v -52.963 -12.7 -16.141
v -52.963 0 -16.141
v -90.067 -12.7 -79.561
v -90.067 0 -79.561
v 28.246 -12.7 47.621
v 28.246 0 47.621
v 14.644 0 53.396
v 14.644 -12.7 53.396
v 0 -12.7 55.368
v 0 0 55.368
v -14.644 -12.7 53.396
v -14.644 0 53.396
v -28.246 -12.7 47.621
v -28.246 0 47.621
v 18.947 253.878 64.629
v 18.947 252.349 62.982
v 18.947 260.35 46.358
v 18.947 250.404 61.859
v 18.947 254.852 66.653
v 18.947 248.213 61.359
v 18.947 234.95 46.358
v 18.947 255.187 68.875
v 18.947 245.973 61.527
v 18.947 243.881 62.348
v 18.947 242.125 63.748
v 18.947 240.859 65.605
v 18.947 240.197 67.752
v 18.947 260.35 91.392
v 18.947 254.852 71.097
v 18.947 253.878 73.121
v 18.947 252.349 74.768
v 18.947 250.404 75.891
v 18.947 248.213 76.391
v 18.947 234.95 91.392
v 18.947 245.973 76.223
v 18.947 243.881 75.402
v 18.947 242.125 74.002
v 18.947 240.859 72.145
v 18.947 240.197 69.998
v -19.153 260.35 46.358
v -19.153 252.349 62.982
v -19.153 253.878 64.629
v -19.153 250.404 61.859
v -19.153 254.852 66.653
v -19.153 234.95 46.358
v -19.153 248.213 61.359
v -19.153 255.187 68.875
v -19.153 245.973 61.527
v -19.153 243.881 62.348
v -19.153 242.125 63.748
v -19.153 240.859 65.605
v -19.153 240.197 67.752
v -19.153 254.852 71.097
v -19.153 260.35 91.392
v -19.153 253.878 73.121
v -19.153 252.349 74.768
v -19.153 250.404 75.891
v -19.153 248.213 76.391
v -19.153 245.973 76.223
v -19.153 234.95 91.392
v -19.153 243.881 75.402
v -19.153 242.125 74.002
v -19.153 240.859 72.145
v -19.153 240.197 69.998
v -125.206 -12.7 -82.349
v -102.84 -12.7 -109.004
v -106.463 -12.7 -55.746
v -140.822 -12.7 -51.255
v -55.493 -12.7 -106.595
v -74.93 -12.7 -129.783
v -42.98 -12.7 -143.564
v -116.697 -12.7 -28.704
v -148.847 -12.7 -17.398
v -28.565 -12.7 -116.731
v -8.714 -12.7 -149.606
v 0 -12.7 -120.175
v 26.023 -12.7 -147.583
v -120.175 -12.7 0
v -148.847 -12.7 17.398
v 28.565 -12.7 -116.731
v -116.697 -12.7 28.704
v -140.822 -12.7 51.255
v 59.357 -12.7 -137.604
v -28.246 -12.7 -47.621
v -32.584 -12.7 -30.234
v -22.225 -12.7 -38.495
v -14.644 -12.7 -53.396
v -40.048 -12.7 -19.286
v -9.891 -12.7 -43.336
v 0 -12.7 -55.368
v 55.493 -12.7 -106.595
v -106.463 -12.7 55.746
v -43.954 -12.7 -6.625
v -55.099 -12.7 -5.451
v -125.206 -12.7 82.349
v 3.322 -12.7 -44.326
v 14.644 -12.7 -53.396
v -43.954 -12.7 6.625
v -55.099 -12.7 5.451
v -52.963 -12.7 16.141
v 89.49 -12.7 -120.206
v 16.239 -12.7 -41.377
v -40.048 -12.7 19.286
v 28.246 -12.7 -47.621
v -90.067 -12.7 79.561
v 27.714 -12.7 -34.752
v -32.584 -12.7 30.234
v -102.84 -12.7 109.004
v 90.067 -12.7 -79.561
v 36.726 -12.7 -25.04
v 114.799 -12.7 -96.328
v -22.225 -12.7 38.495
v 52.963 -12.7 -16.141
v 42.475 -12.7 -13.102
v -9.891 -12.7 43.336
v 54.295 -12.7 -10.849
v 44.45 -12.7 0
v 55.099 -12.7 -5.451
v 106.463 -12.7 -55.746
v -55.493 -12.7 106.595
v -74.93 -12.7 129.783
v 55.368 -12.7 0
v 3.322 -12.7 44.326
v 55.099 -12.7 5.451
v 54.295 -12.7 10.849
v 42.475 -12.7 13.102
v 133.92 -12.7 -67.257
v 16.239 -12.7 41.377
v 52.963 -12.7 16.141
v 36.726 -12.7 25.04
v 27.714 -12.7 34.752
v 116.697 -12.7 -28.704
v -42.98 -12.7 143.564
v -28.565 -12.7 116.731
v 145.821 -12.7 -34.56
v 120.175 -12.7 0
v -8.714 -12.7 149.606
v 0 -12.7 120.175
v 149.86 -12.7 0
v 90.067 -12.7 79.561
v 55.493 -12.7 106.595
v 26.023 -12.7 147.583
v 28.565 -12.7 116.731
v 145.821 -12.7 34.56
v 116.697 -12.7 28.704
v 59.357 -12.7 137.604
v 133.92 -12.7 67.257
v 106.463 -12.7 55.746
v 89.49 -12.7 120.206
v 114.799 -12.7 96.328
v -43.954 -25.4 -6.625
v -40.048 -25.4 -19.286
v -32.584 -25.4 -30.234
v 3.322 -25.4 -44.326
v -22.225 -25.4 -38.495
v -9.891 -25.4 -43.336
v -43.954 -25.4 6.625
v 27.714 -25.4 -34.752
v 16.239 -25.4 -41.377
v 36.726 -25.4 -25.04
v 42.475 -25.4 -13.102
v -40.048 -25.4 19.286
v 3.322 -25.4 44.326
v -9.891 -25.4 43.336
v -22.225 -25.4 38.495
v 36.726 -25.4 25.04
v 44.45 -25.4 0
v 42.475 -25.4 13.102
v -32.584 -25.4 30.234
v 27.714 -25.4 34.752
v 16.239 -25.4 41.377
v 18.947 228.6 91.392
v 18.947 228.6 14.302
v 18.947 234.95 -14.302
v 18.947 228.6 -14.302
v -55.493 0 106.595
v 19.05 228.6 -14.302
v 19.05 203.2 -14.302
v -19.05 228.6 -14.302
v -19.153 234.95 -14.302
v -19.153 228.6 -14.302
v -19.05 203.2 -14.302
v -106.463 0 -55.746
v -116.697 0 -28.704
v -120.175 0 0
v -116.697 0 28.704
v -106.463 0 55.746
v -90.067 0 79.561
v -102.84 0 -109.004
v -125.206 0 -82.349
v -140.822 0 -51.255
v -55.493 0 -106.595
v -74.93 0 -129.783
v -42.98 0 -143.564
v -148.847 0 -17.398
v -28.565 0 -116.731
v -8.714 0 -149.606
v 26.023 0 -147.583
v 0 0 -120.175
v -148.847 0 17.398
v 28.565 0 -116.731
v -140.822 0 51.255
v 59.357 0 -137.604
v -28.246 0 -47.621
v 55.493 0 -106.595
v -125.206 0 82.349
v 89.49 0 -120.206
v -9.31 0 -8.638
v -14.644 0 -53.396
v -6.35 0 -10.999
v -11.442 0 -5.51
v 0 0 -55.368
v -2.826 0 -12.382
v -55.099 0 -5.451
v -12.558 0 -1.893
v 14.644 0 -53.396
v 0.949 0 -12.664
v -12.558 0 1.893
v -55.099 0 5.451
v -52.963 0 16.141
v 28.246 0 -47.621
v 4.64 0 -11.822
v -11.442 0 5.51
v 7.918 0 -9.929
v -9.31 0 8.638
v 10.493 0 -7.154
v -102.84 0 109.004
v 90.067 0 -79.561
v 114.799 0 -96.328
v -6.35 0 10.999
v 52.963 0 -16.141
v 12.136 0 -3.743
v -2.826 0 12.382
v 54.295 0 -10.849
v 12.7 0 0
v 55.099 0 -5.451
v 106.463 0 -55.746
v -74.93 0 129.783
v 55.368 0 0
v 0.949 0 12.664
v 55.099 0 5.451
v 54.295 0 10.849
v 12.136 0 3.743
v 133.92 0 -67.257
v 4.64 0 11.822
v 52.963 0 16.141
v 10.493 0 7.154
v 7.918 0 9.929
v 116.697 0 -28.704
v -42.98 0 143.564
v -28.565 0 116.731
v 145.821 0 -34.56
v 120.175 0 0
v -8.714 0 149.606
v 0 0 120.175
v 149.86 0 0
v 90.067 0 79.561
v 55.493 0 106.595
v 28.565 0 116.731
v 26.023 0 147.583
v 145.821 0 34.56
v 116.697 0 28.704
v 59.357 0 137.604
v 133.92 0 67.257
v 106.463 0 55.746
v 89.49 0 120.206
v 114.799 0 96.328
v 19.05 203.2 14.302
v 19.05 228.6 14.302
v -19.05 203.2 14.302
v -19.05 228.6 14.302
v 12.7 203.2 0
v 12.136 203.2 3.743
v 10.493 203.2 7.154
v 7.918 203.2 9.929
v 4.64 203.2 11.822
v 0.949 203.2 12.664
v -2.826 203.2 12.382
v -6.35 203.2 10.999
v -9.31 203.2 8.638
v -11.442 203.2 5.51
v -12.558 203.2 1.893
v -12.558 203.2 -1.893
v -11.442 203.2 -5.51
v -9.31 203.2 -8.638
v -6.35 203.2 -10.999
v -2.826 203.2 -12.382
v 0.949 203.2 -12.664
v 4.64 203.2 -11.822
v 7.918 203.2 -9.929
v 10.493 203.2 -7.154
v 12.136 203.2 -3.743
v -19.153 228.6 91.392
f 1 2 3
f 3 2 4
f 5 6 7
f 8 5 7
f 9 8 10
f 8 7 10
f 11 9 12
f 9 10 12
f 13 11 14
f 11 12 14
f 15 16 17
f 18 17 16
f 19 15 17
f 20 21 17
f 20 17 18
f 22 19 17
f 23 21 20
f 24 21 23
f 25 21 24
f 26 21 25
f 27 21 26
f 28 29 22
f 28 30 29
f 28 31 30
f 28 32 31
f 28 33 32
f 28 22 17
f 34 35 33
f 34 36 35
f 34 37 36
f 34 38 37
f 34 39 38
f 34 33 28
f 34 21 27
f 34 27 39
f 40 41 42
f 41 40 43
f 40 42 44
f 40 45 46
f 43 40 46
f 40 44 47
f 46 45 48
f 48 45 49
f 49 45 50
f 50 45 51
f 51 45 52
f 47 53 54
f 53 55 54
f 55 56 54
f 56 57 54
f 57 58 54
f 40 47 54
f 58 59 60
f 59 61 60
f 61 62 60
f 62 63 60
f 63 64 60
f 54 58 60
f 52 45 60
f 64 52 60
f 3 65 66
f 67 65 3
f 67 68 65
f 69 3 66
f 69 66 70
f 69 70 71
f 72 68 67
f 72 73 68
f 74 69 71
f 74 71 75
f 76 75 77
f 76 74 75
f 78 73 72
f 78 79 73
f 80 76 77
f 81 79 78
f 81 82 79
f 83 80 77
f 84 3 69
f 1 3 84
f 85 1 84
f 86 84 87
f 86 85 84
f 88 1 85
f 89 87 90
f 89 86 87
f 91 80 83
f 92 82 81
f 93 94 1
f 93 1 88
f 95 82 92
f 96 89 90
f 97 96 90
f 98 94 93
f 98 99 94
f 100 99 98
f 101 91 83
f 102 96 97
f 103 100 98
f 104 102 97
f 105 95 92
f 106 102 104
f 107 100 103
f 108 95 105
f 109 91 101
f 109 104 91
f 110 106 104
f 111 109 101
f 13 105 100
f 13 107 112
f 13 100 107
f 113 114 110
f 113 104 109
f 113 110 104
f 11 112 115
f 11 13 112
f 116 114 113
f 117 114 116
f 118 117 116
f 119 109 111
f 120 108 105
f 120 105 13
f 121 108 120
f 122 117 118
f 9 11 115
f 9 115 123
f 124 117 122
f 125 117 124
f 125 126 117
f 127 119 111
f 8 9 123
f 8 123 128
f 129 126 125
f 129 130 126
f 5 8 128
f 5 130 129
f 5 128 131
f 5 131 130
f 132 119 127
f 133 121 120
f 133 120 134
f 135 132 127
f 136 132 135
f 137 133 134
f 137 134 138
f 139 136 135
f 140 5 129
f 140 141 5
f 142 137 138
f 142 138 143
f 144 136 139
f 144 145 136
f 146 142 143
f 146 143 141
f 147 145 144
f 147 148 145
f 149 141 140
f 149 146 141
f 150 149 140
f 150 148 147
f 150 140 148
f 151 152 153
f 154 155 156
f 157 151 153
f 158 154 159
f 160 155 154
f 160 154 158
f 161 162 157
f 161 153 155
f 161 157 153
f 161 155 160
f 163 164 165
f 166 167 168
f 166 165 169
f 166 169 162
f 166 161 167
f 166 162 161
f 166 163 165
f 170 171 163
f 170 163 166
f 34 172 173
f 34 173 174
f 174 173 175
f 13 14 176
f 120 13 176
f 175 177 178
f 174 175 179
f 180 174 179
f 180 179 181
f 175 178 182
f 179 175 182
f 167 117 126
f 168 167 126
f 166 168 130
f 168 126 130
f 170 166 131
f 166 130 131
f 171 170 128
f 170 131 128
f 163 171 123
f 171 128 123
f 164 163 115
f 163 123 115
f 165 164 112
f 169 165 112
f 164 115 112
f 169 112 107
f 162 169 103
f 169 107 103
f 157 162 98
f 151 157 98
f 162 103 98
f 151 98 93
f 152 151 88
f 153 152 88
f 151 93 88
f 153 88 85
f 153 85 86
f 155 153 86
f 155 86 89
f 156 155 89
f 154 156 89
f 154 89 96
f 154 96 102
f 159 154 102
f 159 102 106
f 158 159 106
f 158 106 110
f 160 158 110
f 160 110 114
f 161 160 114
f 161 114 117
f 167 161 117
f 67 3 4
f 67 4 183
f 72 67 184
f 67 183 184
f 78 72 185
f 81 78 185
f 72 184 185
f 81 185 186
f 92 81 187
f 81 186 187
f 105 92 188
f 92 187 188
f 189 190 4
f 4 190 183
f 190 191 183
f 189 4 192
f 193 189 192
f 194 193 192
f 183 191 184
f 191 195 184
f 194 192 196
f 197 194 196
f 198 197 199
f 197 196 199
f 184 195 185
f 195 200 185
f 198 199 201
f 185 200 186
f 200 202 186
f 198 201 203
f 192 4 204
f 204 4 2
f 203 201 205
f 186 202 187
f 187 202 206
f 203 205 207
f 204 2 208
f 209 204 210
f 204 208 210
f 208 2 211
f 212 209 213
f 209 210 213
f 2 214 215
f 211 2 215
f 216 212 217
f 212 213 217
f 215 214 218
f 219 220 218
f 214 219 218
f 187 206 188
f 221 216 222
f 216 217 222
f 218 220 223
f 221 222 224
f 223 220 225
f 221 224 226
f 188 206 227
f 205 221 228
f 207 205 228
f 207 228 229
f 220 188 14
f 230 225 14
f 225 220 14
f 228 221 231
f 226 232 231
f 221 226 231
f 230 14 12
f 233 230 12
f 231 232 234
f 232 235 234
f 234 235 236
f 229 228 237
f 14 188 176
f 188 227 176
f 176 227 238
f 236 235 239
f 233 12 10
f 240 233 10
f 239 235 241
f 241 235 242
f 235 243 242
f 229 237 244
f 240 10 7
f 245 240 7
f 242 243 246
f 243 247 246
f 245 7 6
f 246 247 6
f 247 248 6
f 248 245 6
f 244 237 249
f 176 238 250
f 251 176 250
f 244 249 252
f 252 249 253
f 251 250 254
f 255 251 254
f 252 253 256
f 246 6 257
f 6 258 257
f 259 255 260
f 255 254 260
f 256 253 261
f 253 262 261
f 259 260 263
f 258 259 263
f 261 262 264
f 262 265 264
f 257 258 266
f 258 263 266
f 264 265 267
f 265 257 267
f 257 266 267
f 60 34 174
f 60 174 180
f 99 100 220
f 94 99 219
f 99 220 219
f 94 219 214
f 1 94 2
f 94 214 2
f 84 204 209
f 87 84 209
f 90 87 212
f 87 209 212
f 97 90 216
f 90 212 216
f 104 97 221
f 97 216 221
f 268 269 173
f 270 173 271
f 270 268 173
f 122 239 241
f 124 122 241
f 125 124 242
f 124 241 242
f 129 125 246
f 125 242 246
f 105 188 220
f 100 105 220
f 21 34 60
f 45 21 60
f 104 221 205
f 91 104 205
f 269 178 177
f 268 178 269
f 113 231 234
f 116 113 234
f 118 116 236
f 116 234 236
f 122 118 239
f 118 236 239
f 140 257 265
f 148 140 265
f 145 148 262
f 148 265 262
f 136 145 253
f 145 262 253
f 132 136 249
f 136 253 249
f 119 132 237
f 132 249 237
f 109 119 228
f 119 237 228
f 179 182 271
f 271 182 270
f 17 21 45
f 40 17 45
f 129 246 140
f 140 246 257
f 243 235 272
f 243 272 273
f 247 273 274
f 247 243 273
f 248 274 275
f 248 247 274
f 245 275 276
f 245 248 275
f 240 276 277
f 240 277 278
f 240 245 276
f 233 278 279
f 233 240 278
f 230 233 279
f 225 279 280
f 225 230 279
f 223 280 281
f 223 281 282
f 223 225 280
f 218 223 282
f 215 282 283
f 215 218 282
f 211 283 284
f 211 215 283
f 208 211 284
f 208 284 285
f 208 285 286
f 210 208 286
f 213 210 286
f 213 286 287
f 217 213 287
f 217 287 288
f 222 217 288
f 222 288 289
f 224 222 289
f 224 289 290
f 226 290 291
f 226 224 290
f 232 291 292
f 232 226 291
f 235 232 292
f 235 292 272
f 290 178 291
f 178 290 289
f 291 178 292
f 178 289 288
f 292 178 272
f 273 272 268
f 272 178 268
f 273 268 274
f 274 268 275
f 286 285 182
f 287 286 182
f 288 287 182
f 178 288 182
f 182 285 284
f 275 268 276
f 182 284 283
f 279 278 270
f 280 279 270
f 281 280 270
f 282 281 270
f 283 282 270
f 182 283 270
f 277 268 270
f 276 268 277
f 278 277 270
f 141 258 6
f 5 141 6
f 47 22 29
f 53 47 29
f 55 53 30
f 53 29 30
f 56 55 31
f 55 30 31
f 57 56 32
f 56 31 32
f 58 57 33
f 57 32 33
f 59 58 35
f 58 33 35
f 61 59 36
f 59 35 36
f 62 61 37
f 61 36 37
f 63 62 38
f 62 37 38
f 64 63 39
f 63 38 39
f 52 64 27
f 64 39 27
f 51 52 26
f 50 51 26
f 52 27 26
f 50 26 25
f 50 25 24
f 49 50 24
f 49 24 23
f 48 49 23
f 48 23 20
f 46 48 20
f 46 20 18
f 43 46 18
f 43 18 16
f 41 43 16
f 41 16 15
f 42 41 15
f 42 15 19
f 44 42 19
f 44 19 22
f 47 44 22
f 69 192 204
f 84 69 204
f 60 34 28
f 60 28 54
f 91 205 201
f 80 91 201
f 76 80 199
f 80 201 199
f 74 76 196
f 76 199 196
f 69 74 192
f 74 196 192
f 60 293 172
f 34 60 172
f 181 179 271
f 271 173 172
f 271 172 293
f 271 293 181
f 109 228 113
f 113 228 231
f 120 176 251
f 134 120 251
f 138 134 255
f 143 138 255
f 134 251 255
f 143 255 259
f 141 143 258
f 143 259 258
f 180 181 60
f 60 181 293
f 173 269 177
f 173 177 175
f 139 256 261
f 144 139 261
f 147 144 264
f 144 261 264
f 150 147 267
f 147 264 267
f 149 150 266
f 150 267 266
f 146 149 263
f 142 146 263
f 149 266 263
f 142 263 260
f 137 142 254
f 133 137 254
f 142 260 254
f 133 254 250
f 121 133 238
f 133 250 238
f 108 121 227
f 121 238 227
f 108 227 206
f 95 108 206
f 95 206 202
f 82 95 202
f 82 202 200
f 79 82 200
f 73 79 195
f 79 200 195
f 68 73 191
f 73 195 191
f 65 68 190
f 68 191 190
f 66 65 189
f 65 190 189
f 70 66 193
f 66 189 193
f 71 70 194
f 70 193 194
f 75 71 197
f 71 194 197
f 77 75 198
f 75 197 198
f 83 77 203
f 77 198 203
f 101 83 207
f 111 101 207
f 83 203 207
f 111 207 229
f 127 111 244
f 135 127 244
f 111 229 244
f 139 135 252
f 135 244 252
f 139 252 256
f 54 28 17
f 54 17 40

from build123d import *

# Parameters (mm, degrees)
F0_R      = 149.86
F0_R_2    = 26.648736698
F1_DEPTH  = 12.7
F2_R      = 44.45
F3_DEPTH  = 25.4
F4_R      = 12.7
F5_DEPTH  = 203.2
F6_W      = 38.1
F6_H      = 28.603638758
F6_R      = 12.7
F7_DEPTH  = 25.4
F8_W      = 37.9969605684
F8_H      = 28.603638758
F9_DEPTH  = 6.35
F10_W     = 38.1
F10_H     = 45.033685863
F11_DEPTH = 25.4
F12_R     = 7.5372344928
F13_DEPTH = 44.196


with BuildPart() as f1:
    # F0 (on Front) → F1 (new body)
    with BuildSketch(Plane.XZ):
        Circle(F0_R)
        with BuildLine():
            ThreePointArc((90.0671052077, 79.5609525029), (112.3962682088, 42.5336043194), (120.17499159, 0))
            ThreePointArc((120.17499159, 0), (112.3962682088, -42.5336043194), (90.0671052077, -79.5609525029))
            ThreePointArc((90.0671052077, -79.5609525029), (74.0247348127, -94.66977997), (55.4931745404, -106.5951977487))
            ThreePointArc((55.4931745404, -106.5951977487), (0, -120.17499159), (-55.4931745404, -106.5951977487))
            ThreePointArc((-55.4931745404, -106.5951977487), (-74.0247348127, -94.66977997), (-90.0671052077, -79.5609525029))
            ThreePointArc((-90.0671052077, -79.5609525029), (-120.17499159, 0), (-90.0671052077, 79.5609525029))
            ThreePointArc((-90.0671052077, 79.5609525029), (-74.0247348127, 94.66977997), (-55.4931745404, 106.5951977487))
            ThreePointArc((-55.4931745404, 106.5951977487), (0, 120.17499159), (55.4931745404, 106.5951977487))
            ThreePointArc((55.4931745404, 106.5951977487), (74.0247348127, 94.66977997), (90.0671052077, 79.5609525029))
        make_face(mode=Mode.SUBTRACT)
        with BuildLine():
            ThreePointArc((55.3679829909, 0), (54.7634248849, 8.1597080434), (52.9629527999, 16.1412258268))
            ThreePointArc((52.9629527999, 16.1412258268), (43.5483936402, 34.1928494255), (28.2457494791, 47.6213311116))
            ThreePointArc((28.2457494791, 47.6213311116), (0, 55.3679829909), (-28.2457494791, 47.6213311116))
            ThreePointArc((-28.2457494791, 47.6213311116), (-43.5483936402, 34.1928494255), (-52.9629527999, 16.1412258268))
            ThreePointArc((-52.9629527999, 16.1412258268), (-55.3679829909, 0), (-52.9629527999, -16.1412258268))
            ThreePointArc((-52.9629527999, -16.1412258268), (-43.5483936402, -34.1928494255), (-28.2457494791, -47.6213311116))
            ThreePointArc((-28.2457494791, -47.6213311116), (0, -55.3679829909), (28.2457494791, -47.6213311116))
            ThreePointArc((28.2457494791, -47.6213311116), (43.5483936402, -34.1928494255), (52.9629527999, -16.1412258268))
            ThreePointArc((52.9629527999, -16.1412258268), (54.7634248849, -8.1597080434), (55.3679829909, 0))
        make_face()
        Circle(F0_R_2, mode=Mode.SUBTRACT)
        with BuildLine():
            Line((-28.2457494791, 47.6213311116), (-55.4931745404, 106.5951977487))
            ThreePointArc((-55.4931745404, 106.5951977487), (-74.0247348127, 94.66977997), (-90.0671052077, 79.5609525029))
            Line((-90.0671052077, 79.5609525029), (-52.9629527999, 16.1412258268))
            ThreePointArc((-52.9629527999, 16.1412258268), (-43.5483936402, 34.1928494255), (-28.2457494791, 47.6213311116))
        make_face()
        with BuildLine():
            ThreePointArc((-90.0671052077, -79.5609525029), (-74.0247348127, -94.66977997), (-55.4931745404, -106.5951977487))
            Line((-55.4931745404, -106.5951977487), (-28.2457494791, -47.6213311116))
            ThreePointArc((-28.2457494791, -47.6213311116), (-43.5483936402, -34.1928494255), (-52.9629527999, -16.1412258268))
            Line((-52.9629527999, -16.1412258268), (-90.0671052077, -79.5609525029))
        make_face()
        with BuildLine():
            ThreePointArc((55.4931745404, -106.5951977487), (74.0247348127, -94.66977997), (90.0671052077, -79.5609525029))
            Line((90.0671052077, -79.5609525029), (52.9629527999, -16.1412258268))
            ThreePointArc((52.9629527999, -16.1412258268), (43.5483936402, -34.1928494255), (28.2457494791, -47.6213311116))
            Line((28.2457494791, -47.6213311116), (55.4931745404, -106.5951977487))
        make_face()
        with BuildLine():
            Line((52.9629527999, 16.1412258268), (90.0671052077, 79.5609525029))
            ThreePointArc((90.0671052077, 79.5609525029), (74.0247348127, 94.66977997), (55.4931745404, 106.5951977487))
            Line((55.4931745404, 106.5951977487), (28.2457494791, 47.6213311116))
            ThreePointArc((28.2457494791, 47.6213311116), (43.5483936402, 34.1928494255), (52.9629527999, 16.1412258268))
        make_face()
    extrude(amount=F1_DEPTH)

    # F2 (on Front) → F3 (join)
    with BuildSketch(Plane.XZ):
        Circle(F2_R)
    extrude(amount=F3_DEPTH)

    # F4 (on Front) → F5 (join)
    with BuildSketch(Plane.XZ):
        Circle(F4_R)
    extrude(amount=-F5_DEPTH)

    # F6 (on face) → F7 (join)
    with BuildSketch(Plane(origin=(0, 203.2, 0), x_dir=(-1, 0, 0), z_dir=(0, 1, 0))):
        Rectangle(F6_W, F6_H)
        Circle(F6_R, mode=Mode.SUBTRACT)
        Circle(F6_R)
    extrude(amount=F7_DEPTH)

    # F8 (on face) → F9 (join)
    with BuildSketch(Plane(origin=(0, 228.6, 0), x_dir=(-1, 0, 0), z_dir=(0, 1, 0))):
        Polygon((19.05, 14.301819379), (19.05, -14.301819379), (19.1530394316, -14.301819379), (19.1530394316, 91.3918912411), (-18.9469605684, 91.3918912411), (-18.9469605684, 14.301819379), align=None)
        with Locations((0.0515197158, 0)):
            Rectangle(F8_W, F8_H)
    extrude(amount=F9_DEPTH)


with BuildPart() as f11:
    # F10 (on face) → F11 (new body)
    with BuildSketch(Plane(origin=(0, 234.95, 0), x_dir=(-1, 0, 0), z_dir=(0, 1, 0))):
        with Locations((0.1030394316, 68.8750483096)):
            Rectangle(F10_W, F10_H)
    extrude(amount=F11_DEPTH)

    # F12 (on face) → F13 (cut)
    with BuildSketch(Plane.YZ.offset(18.9469605684)):
        with Locations((247.65, 68.8750483096)):
            Circle(F12_R)
    extrude(amount=-F13_DEPTH, mode=Mode.SUBTRACT)


solid = Compound([f1.part, f11.part])
